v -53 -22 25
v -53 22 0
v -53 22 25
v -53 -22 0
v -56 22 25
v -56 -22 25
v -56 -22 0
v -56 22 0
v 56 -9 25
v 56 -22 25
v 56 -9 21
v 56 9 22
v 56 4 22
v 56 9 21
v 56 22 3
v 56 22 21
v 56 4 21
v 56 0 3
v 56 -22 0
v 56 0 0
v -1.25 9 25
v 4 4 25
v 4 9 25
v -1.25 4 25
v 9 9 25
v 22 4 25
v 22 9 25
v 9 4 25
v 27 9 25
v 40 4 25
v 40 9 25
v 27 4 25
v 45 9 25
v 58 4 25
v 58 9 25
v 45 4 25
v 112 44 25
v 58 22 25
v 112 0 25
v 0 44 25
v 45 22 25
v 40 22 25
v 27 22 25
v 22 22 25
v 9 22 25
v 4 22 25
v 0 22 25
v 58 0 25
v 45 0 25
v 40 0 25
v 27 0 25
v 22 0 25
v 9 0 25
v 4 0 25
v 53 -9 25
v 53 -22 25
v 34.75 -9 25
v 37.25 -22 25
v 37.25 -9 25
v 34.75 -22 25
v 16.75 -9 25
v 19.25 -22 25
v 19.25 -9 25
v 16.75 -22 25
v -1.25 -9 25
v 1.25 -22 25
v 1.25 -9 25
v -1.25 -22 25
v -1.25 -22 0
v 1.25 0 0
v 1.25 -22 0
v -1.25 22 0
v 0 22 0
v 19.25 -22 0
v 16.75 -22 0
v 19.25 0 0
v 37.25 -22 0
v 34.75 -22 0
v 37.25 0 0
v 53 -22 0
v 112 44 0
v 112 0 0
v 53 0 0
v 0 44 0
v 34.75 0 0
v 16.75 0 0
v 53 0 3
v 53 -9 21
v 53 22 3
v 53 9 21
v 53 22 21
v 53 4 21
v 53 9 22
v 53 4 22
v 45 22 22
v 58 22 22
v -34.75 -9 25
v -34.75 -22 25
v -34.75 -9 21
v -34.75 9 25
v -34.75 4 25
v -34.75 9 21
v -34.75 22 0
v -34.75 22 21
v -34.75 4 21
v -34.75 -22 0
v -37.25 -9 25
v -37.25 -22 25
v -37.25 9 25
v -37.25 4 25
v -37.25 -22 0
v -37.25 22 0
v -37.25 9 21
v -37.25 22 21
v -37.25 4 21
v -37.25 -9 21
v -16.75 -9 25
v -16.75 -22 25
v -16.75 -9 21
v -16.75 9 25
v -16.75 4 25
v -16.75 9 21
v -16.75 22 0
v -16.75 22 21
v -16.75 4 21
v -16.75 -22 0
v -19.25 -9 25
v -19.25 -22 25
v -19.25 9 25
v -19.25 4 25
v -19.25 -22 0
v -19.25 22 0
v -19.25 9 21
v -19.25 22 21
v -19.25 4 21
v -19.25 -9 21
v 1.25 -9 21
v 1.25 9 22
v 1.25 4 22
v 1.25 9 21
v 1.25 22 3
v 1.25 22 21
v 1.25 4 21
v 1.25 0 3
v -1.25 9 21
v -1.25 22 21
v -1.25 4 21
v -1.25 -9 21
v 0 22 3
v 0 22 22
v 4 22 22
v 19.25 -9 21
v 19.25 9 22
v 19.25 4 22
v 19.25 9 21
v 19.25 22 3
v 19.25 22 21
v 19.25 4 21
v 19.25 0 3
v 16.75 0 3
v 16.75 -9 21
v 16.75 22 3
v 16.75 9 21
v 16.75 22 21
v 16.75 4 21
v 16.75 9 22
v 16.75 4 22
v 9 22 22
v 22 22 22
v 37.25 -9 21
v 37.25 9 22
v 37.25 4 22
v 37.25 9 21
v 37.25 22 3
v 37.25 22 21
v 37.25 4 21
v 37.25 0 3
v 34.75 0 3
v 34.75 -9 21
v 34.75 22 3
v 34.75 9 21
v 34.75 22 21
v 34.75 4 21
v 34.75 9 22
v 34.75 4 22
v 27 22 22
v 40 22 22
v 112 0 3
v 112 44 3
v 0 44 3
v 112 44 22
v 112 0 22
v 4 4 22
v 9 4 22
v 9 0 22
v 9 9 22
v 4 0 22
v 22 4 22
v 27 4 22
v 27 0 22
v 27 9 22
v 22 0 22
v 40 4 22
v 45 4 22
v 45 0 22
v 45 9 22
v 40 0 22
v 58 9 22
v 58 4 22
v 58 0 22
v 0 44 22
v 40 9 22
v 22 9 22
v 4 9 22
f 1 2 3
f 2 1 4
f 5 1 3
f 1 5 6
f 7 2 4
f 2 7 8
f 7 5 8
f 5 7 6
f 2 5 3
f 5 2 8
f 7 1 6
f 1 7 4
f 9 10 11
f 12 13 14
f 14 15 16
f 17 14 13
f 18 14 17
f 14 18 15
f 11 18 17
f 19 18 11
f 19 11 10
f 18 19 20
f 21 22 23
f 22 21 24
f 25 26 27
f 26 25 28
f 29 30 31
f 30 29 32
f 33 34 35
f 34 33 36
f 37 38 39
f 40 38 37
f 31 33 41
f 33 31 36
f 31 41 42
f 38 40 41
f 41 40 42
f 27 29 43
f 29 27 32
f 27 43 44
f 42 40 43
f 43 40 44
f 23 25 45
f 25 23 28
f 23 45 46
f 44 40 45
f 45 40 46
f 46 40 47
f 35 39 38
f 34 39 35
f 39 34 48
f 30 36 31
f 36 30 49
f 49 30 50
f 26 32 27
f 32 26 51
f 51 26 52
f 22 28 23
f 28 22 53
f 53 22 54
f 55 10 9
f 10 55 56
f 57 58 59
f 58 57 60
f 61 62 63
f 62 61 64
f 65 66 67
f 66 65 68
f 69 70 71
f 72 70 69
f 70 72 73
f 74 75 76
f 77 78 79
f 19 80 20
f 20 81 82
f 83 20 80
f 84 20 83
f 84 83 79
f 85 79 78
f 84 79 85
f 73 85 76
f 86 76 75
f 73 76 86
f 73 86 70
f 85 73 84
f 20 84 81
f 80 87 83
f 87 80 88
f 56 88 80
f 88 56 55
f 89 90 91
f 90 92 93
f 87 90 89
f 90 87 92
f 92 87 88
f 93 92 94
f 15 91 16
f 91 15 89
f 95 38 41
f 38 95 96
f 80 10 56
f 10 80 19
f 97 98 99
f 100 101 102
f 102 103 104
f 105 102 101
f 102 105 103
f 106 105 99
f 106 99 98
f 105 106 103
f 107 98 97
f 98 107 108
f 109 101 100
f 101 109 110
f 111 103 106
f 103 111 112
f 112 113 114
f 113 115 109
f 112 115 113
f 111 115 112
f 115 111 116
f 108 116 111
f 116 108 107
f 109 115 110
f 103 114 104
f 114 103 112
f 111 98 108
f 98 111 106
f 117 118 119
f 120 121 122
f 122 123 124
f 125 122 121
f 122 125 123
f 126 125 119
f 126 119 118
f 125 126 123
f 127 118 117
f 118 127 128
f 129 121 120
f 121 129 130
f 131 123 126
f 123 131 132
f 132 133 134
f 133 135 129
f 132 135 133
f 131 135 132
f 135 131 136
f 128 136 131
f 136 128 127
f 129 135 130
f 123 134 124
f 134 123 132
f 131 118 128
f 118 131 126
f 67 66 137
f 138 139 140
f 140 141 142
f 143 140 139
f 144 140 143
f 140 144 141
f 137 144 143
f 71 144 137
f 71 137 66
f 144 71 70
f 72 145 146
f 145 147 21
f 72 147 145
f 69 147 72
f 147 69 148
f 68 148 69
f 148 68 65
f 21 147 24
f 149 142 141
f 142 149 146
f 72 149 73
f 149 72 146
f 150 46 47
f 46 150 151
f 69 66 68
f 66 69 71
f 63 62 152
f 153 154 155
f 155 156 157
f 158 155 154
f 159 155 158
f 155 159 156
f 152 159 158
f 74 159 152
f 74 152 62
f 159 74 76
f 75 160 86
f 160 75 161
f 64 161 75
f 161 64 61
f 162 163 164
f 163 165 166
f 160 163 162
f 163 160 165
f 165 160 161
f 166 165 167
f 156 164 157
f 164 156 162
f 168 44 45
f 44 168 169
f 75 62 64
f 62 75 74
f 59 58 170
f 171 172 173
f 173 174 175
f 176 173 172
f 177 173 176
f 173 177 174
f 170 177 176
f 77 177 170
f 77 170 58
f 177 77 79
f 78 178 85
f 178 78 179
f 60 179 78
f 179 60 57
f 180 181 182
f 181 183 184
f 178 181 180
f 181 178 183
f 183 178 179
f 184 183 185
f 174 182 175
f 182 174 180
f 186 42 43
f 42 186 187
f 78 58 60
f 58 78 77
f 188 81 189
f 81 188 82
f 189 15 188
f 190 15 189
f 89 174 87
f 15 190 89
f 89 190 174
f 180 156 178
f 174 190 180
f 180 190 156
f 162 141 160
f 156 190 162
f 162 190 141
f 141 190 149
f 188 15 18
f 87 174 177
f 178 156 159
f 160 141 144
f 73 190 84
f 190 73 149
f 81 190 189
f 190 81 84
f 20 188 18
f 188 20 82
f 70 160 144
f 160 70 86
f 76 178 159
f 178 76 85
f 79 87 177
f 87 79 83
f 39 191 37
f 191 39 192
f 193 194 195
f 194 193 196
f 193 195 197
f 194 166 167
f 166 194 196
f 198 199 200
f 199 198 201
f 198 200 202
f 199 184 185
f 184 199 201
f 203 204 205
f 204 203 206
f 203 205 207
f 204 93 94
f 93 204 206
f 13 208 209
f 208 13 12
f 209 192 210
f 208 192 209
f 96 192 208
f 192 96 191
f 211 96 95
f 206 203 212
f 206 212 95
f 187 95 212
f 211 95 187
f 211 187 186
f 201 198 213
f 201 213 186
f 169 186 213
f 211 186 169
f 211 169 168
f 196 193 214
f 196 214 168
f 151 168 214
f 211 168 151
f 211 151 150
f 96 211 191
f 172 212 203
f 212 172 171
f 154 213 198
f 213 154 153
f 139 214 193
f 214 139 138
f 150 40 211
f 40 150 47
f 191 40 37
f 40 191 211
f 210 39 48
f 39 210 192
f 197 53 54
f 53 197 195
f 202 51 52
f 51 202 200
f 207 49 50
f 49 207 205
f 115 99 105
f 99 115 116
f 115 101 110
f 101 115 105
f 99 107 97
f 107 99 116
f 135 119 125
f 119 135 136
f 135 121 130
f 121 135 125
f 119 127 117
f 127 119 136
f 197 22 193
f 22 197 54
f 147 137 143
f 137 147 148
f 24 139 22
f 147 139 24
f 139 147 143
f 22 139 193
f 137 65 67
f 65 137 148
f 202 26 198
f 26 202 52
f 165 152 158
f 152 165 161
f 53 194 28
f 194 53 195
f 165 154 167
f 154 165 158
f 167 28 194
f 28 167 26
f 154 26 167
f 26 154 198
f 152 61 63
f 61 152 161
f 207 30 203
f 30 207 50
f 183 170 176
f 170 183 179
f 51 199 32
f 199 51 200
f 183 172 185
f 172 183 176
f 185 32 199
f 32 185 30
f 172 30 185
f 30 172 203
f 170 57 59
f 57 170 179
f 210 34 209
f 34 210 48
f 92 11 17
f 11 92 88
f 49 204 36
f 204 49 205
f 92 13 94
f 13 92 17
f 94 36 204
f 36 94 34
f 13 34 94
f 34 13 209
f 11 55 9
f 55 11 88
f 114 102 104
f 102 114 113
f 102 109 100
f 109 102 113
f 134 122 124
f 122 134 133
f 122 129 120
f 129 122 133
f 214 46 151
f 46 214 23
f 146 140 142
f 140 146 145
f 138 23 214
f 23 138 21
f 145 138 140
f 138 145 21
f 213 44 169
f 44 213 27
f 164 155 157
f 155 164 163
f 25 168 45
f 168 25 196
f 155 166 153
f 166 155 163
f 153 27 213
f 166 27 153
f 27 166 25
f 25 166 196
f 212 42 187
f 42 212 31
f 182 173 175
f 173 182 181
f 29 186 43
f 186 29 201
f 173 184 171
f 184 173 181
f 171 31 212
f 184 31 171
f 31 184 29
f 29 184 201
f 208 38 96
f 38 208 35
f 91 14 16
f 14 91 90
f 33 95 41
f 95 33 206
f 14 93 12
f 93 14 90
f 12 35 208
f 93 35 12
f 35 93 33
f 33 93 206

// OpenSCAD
// 12-cuvette rack, printed standing on its base (z = 0 to 25)
// All dimensions in mm, measured with calipers.

// --- Plate dimensions (base & deck) ---
plate_x = 112;   // X extent of base and deck plates
plate_y = 44;    // Y extent of base and deck plates
base_t  = 3;     // base plate thickness (z 0..3)
deck_t  = 3;     // deck plate thickness (z 22..25)
deck_z  = 22;    // bottom of deck plate
total_h = 25;    // overall height of the rack

// --- Wall / rib dimensions ---
end_wall_t  = 3;    // thickness of the two end walls (along X)
rib_t       = 2.5;  // thickness of the five internal ribs (along X)
rib_x       = [-36, -18, 0, 18, 36]; // X centres of the five ribs

// --- Cuvette through-holes in the deck ---
hole_size = 13;    // 13 x 13 mm square through-holes
hole_pitch = 18;   // 18 mm centre-to-centre in both X and Y
hole_rows  = 2;    // rows along Y
hole_cols  = 6;    // columns along X

$fn = 64;

// ---------------------------------------------------------------------------
// Base plate (z 0..3), centred on origin in X and Y
// ---------------------------------------------------------------------------
module base_plate() {
    translate([0, 0, 0])
        cube([plate_x, plate_y, base_t], center = [true, true, false]);
}

// ---------------------------------------------------------------------------
// Deck plate (z 22..25), centred on origin in X and Y
// ---------------------------------------------------------------------------
module deck_plate() {
    translate([0, 0, deck_z])
        cube([plate_x, plate_y, deck_t], center = [true, true, false]);
}

// ---------------------------------------------------------------------------
// Seven upright walls, full height (z 0..25), full Y depth, centred in X and Y
// ---------------------------------------------------------------------------
module walls() { union() {
    // Two 3 mm end walls flush with the short ends
    for (sx = [-1, 1]) {
        x_c = sx * (plate_x / 2 - end_wall_t / 2);
        translate([x_c, 0, total_h / 2])
            cube([end_wall_t, plate_y, total_h], center = true);
    }
    // Five 2.5 mm internal ribs at the given X centres
    for (x_c = rib_x) {
        translate([x_c, 0, total_h / 2])
            cube([rib_t, plate_y, total_h], center = true);
    }
} }

// ---------------------------------------------------------------------------
// 12 square through-holes in the deck (2 rows x 6 cols, 18 mm pitch)
// Each cutter extends 1 mm past the top and bottom faces of the deck.
// ---------------------------------------------------------------------------
module hole_cutters() { union() {
    for (i = [0 : hole_rows - 1]) {
        y_c = (i - (hole_rows - 1) / 2) * hole_pitch;
        for (j = [0 : hole_cols - 1]) {
            x_c = (j - (hole_cols - 1) / 2) * hole_pitch;
            translate([x_c, y_c, deck_z - 1])
                cube([hole_size, hole_size, deck_t + 2], center = [true, true, false]);
        }
    }
} }

// ---------------------------------------------------------------------------
// Assemble the rack
// ---------------------------------------------------------------------------
difference() {
    union() {
        base_plate();
        deck_plate();
        walls();
    }
    hole_cutters();
}
